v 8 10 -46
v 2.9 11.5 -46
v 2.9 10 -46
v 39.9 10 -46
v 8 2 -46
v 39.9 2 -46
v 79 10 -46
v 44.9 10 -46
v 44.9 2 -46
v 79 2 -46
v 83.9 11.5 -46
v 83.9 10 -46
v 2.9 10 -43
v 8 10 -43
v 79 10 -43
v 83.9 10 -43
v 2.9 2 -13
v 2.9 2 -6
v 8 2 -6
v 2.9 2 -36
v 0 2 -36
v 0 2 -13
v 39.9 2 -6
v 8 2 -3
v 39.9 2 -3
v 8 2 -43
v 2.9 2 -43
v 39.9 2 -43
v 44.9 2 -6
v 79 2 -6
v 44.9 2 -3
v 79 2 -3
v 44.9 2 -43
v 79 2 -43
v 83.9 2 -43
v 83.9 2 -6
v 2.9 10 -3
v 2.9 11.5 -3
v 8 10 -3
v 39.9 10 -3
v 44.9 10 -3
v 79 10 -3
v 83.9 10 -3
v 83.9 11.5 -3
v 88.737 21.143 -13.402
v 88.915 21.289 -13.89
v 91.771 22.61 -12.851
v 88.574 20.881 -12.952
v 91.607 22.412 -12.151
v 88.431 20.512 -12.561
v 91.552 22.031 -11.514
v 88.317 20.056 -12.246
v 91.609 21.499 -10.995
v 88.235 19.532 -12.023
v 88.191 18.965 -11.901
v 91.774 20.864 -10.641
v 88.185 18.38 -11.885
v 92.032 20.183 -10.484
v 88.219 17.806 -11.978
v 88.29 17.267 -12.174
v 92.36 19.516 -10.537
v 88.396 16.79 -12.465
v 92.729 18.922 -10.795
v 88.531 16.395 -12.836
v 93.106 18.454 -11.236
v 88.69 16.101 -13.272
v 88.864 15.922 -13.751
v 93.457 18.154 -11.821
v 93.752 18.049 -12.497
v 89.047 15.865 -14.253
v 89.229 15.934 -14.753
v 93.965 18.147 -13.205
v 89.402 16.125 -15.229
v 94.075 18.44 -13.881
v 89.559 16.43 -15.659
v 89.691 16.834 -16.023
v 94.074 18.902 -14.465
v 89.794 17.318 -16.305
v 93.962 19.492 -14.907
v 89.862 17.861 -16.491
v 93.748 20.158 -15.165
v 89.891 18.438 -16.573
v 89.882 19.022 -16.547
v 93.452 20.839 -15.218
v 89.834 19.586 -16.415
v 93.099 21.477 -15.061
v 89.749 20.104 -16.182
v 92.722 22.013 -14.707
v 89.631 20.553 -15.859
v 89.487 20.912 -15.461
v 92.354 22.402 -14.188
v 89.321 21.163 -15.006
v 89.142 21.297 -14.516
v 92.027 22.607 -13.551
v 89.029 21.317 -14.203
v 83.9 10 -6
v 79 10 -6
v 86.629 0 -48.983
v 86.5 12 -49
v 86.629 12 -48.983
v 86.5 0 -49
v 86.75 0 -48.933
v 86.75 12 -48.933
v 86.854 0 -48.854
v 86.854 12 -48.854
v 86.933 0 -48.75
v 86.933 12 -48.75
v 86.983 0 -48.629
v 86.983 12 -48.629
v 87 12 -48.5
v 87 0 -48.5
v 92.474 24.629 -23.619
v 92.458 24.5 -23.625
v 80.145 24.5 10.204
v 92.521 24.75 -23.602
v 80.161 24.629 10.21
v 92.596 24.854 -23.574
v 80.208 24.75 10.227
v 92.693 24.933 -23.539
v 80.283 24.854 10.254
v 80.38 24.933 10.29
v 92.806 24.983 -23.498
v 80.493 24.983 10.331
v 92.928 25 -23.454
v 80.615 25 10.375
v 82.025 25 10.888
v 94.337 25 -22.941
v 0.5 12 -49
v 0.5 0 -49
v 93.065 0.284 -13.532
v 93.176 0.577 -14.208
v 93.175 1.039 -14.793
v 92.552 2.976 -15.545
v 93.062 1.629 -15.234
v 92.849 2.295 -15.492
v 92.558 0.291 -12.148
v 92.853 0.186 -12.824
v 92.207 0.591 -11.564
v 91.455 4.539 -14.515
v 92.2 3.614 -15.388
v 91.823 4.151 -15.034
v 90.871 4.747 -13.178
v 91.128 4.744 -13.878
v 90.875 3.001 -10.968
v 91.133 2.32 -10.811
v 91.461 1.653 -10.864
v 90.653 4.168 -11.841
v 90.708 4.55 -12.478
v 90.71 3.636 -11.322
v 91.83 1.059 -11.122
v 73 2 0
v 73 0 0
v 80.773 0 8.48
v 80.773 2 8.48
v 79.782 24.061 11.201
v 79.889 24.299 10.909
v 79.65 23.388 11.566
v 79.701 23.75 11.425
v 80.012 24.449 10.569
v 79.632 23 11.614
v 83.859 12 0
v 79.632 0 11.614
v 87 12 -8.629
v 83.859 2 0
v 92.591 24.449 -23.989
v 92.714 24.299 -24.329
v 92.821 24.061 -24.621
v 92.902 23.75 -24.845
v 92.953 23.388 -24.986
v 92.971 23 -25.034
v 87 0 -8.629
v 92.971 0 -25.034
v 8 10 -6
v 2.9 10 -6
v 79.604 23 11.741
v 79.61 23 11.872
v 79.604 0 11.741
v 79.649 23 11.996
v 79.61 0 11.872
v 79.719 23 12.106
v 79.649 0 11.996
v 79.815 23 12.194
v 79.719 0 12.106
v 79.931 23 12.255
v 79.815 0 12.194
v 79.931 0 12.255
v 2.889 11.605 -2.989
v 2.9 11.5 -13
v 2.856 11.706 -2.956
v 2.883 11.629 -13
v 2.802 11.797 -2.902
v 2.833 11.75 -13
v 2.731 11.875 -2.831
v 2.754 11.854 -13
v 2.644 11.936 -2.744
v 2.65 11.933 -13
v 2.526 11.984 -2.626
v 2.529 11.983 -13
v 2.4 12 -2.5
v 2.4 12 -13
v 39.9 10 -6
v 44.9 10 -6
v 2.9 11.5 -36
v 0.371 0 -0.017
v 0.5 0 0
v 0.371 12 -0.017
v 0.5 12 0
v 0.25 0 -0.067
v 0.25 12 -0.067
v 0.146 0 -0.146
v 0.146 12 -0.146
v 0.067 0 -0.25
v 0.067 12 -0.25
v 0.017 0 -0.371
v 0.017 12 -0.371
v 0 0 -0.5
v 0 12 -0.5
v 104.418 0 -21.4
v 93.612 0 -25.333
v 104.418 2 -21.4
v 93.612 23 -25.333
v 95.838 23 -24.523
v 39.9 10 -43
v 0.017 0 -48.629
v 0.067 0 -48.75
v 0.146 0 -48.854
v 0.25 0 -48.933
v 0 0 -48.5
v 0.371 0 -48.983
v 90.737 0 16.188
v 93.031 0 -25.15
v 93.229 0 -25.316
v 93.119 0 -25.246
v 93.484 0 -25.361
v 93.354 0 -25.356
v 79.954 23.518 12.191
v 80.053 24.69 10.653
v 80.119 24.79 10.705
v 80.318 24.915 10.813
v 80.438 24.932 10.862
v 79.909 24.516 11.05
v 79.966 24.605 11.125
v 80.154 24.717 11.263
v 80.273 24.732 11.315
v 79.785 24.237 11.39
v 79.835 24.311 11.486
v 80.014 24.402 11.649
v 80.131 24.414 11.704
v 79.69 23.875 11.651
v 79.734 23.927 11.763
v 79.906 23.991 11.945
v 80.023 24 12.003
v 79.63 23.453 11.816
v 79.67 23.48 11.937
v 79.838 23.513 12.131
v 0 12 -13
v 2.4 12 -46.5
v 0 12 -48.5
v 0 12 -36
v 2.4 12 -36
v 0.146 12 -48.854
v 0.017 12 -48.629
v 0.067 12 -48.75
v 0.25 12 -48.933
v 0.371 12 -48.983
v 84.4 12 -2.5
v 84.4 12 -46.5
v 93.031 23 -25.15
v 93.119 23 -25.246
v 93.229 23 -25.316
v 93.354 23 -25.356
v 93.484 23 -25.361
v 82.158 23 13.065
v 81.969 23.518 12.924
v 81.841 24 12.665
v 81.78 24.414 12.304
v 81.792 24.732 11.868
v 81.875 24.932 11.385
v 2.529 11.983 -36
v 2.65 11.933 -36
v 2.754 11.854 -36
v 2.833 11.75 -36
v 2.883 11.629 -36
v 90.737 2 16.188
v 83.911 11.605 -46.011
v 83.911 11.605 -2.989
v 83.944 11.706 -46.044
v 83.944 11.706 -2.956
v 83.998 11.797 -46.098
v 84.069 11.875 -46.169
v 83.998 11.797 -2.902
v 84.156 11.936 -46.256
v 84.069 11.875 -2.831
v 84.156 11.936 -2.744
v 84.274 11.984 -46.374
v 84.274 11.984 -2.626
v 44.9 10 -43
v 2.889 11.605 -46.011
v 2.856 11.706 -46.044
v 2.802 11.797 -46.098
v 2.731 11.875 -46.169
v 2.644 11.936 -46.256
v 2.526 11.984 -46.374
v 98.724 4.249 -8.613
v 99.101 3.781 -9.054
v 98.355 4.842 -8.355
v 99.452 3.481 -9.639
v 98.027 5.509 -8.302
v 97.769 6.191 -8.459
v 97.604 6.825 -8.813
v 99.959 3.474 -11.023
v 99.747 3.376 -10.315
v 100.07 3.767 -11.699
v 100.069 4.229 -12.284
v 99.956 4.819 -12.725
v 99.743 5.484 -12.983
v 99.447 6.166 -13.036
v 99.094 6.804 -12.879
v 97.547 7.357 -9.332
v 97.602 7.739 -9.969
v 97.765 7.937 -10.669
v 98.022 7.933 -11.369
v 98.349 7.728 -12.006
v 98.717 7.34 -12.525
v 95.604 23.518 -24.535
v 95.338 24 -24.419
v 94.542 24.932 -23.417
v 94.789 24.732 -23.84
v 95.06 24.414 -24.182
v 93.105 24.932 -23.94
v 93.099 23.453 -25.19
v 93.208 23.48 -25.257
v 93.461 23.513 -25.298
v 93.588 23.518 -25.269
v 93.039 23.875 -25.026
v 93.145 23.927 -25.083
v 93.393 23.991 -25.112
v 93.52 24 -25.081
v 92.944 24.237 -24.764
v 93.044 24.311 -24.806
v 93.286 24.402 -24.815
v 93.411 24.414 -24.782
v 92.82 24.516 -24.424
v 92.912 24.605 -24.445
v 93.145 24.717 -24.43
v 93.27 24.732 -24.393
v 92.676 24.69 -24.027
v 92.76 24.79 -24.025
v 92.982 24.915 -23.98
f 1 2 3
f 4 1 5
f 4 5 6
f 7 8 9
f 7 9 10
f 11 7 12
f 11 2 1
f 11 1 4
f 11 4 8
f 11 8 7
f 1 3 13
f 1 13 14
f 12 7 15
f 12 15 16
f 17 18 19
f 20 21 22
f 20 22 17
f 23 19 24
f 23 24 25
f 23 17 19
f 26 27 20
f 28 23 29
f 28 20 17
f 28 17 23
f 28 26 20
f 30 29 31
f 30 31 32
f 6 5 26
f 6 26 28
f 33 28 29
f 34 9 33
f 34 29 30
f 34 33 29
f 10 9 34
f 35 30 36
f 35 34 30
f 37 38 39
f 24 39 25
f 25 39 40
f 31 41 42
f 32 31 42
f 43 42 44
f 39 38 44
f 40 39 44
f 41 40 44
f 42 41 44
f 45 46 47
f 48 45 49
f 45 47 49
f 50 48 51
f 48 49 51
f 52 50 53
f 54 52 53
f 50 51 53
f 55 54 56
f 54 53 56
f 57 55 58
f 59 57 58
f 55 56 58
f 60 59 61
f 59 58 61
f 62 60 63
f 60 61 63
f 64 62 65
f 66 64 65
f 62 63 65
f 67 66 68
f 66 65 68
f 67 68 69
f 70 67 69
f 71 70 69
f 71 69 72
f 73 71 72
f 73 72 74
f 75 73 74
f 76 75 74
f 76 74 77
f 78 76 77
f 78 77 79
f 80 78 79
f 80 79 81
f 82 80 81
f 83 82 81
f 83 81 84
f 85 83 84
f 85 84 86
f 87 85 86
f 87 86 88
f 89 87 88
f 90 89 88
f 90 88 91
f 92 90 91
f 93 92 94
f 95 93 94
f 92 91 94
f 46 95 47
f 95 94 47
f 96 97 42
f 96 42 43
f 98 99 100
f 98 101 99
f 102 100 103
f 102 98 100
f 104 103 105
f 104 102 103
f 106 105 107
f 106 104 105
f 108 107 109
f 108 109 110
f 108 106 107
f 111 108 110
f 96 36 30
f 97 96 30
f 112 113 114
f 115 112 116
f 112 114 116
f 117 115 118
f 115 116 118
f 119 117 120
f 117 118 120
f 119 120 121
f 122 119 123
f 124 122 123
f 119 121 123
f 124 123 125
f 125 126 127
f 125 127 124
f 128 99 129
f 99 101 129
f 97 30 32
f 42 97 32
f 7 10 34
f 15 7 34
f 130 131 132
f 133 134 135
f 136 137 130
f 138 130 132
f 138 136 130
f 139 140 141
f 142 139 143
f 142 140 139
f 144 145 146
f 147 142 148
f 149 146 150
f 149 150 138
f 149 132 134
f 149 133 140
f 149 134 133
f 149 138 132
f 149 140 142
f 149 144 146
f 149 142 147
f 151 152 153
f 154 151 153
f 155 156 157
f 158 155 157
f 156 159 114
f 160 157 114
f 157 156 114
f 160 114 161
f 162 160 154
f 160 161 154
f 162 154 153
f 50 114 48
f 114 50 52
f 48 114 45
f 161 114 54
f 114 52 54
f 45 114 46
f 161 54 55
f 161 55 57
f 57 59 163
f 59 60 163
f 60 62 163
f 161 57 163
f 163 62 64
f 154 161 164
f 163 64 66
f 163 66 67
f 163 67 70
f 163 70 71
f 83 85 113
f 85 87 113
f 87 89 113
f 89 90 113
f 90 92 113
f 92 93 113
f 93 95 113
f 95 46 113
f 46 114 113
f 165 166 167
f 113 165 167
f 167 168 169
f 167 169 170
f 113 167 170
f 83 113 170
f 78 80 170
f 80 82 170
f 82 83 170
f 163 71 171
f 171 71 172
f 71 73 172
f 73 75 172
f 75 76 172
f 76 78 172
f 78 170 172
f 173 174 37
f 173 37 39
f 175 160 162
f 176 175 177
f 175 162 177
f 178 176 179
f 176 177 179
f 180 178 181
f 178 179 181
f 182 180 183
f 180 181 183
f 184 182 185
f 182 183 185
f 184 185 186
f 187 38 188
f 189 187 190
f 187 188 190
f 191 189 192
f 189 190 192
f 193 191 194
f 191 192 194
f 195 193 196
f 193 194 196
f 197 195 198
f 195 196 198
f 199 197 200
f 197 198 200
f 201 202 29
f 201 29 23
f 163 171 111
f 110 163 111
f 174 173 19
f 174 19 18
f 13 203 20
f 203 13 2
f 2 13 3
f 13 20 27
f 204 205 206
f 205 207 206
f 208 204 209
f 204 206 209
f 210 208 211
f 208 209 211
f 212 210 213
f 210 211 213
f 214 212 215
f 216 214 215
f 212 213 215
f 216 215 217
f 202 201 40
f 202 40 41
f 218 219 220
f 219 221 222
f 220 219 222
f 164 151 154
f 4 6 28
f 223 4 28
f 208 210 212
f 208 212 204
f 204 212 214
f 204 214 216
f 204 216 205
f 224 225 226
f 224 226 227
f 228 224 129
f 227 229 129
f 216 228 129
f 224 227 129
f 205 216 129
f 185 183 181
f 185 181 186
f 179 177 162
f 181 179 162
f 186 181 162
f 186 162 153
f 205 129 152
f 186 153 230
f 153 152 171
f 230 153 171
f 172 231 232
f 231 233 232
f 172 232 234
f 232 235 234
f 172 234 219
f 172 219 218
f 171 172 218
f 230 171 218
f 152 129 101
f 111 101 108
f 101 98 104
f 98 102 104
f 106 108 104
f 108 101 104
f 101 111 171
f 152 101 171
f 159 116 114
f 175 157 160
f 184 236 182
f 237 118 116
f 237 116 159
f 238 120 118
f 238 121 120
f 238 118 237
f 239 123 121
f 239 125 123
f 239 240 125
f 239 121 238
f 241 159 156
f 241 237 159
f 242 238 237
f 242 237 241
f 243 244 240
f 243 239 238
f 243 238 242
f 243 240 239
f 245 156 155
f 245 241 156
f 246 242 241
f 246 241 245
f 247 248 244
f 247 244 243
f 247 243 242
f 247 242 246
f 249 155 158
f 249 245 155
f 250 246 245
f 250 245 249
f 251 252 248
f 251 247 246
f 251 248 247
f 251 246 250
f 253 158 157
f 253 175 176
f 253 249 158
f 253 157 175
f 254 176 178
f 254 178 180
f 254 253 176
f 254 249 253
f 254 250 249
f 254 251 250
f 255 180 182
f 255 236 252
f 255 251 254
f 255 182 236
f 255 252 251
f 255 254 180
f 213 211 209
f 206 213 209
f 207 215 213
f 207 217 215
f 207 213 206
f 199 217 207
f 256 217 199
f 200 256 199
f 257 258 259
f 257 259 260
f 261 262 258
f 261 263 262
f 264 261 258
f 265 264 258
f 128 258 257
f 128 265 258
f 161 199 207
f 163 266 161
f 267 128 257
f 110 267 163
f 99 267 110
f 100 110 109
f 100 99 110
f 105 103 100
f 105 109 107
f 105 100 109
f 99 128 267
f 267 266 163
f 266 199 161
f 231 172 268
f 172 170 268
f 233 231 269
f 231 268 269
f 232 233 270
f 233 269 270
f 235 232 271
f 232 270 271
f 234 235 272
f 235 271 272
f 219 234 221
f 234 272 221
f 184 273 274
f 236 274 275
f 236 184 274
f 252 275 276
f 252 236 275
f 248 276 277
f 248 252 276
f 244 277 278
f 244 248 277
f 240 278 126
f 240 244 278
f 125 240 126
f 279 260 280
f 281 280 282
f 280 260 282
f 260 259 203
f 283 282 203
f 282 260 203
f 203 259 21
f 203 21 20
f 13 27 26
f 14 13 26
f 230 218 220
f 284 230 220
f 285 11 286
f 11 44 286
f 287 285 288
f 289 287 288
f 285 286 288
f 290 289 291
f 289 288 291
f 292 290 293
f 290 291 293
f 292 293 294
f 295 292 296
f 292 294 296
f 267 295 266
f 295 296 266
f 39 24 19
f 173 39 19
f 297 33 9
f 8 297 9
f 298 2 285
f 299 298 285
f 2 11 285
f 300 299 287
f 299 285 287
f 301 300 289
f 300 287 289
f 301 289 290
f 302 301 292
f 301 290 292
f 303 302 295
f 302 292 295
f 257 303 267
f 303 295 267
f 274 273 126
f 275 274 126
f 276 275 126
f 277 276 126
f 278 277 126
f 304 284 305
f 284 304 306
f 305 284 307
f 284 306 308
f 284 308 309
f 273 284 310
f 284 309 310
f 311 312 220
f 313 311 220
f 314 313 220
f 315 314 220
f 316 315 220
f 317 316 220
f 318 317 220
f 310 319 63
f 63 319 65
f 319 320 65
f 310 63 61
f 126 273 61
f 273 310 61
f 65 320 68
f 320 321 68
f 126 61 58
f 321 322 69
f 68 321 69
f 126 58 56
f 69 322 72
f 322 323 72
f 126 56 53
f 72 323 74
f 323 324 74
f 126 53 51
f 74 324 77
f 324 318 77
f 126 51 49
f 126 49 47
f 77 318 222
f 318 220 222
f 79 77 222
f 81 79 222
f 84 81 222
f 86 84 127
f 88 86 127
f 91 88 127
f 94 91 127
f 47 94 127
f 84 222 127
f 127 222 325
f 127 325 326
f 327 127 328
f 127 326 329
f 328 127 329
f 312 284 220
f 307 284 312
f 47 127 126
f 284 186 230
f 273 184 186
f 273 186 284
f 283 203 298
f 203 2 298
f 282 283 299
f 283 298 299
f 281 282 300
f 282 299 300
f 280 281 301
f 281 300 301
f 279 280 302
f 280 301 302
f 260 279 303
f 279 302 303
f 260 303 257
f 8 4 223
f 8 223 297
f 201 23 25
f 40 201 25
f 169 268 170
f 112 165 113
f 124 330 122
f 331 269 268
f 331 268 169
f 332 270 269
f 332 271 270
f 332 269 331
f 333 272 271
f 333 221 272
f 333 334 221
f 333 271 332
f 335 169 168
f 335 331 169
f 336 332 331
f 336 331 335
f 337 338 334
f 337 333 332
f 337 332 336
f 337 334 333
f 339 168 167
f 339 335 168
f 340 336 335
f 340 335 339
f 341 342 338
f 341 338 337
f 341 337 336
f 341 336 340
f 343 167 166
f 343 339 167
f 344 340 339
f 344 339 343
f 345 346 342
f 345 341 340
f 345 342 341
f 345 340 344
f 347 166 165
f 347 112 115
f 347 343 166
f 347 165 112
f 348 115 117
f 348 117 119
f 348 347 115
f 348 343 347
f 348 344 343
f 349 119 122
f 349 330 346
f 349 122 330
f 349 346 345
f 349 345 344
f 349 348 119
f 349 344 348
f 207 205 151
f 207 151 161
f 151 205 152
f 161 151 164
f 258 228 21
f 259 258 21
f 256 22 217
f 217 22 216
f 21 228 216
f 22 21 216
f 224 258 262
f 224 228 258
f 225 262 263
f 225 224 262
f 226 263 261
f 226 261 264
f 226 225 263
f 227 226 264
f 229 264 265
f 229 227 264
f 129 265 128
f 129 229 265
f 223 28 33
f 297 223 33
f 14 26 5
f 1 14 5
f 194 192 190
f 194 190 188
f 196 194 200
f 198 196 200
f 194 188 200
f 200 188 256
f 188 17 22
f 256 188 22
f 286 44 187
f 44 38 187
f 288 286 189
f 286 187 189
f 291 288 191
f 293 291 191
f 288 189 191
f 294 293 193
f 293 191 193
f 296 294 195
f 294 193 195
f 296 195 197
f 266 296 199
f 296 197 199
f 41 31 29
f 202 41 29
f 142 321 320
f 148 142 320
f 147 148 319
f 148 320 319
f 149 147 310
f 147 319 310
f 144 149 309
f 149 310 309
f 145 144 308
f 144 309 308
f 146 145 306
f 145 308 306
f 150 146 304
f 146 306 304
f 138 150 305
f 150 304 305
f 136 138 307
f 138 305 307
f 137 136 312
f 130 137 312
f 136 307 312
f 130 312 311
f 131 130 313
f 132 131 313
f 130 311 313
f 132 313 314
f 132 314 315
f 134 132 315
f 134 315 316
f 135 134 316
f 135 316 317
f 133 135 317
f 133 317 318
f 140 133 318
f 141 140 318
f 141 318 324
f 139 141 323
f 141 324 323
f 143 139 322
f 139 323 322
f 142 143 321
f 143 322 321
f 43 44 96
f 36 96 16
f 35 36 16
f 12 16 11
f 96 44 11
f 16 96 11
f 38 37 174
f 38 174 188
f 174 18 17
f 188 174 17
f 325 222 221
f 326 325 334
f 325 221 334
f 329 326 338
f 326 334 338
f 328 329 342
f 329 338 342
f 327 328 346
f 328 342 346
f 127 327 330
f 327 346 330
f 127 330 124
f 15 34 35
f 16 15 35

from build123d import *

# Parameters (mm, degrees)
BOSS_EXTRUDE1_DEPTH   = 40
BODY_MOVE_COPY1_ANGLE = 20
BOSS_EXTRUDE2_DEPTH   = 2
BOSS_EXTRUDE3_DEPTH   = 12
SKETCH4_R             = 2.5
CUT_EXTRUDE2_DEPTH    = 8
FILLET1_R             = 2
SKETCH10_W            = 4.9
SKETCH10_H            = 3
SKETCH10_W_2          = 5.1
SKETCH10_W_3          = 5
CUT_EXTRUDE4_DEPTH    = 2
FILLET2_R             = 0.5


with BuildPart() as part:
    # Sketch2 → Boss-Extrude1 (new body)
    with BuildSketch(Plane.XY):
        Polygon((90, 0), (102, 0), (102, 2), (92, 25), (90, 25), align=None)
    extrude(amount=BOSS_EXTRUDE1_DEPTH)


with BuildPart() as part_1:
    # Body-Move/Copy1: moved
    add(part.part.rotate(Axis((95, 0, 20), (0, -1, 0)), BODY_MOVE_COPY1_ANGLE))


with BuildPart() as part_2:
    # Body-Move/Copy2: moved
    add(part_1.part.moved(Location((-4, 0, -25))))

    # Sketch1 → Boss-Extrude2 (add)
    with BuildSketch(Plane(origin=(0, 0, 0), x_dir=(1, 0, 0), z_dir=(0, 1, 0))):
        Polygon((0, 49), (0, 0), (73, 0), (84, -12), (87, 0), (87, 49), align=None)
    extrude(amount=BOSS_EXTRUDE2_DEPTH)

    # Sketch1<4> → Boss-Extrude3 (add)
    with BuildSketch(Plane(origin=(0, 0, 0), x_dir=(1, 0, 0), z_dir=(0, 1, 0))):
        Polygon((8, 43), (8, 46), (39.9, 46), (39.9, 43), (44.9, 43), (44.9, 46), (79, 46), (79, 43), (83.9, 43), (83.9, 6), (79, 6), (79, 3), (44.9, 3), (44.9, 6), (39.9, 6), (39.9, 3), (8, 3), (8, 6), (2.9, 6), (2.9, 13), (0, 13), (0, 0), (73, 0), (87, 0), (87, 49), (0, 49), (0, 36), (2.9, 36), (2.9, 43), align=None)
    extrude(amount=BOSS_EXTRUDE3_DEPTH)

    # Sketch4 → Cut-Extrude2 (cut)
    with BuildSketch(Plane(origin=(72.447790922, 33.520577724, 26.368839434), x_dir=(0.30020671045987535, 0.09758957417323016, -0.948868908757974), z_dir=(0.8617639646050662, 0.3987261114144503, 0.31365643207890637))):
        with Locations(Location((42.044187921, -18.952687866, 0), (0, 0, 92.148700458))):
            Circle(SKETCH4_R)
        with Locations(Location((40.341555526, -34.861837527, 0), (0, 0, 92.148700458))):
            Circle(SKETCH4_R)
    extrude(amount=-CUT_EXTRUDE2_DEPTH, mode=Mode.SUBTRACT)

    # Fillet1
    fillet1_edges = [part_2.edges().sort_by_distance(p)[0] for p in [
        (80.40082665, 25, 12.425771842),
        (94.081632383, 25, -25.161932989),
    ]]
    fillet(fillet1_edges, radius=FILLET1_R)

    # Sketch10 → Cut-Extrude4 (cut)
    with BuildSketch(Plane(origin=(0, 12, 0), x_dir=(1, 0, 0), z_dir=(0, 1, 0))):
        with Locations((81.45, 4.5)):
            Rectangle(SKETCH10_W, SKETCH10_H)
        with Locations((42.45, 4.5)):
            Rectangle(SKETCH10_W_2, SKETCH10_H)
        with Locations((42.4, 44.5)):
            Rectangle(SKETCH10_W_3, SKETCH10_H)
        with Locations((81.45, 44.5)):
            Rectangle(SKETCH10_W, SKETCH10_H)
        with Locations((5.45, 44.5)):
            Rectangle(SKETCH10_W_2, SKETCH10_H)
        with Locations((5.45, 4.5)):
            Rectangle(SKETCH10_W_2, SKETCH10_H)
    extrude(amount=-CUT_EXTRUDE4_DEPTH, mode=Mode.SUBTRACT)

    # Fillet2
    fillet2_edges = [part_2.edges().sort_by_distance(p)[0] for p in [
        (86.301536896, 25, -6.710100717),
        (79.46113403, 11.5, 12.083751699),
        (93.141939763, 11.5, -25.503953132),
        (79.661484791, 24.414213562, 11.533292506),
        (92.941589001, 24.414213562, -24.95349394),
        (87, 6, -49),
        (0, 6, -49),
        (0, 6, 0),
        (2.9, 12, -41),
        (43.4, 12, -46),
        (83.9, 12, -24.5),
        (2.9, 12, -8),
        (43.4, 12, -3),
    ]]
    fillet(fillet2_edges, radius=FILLET2_R)


solid = part_2.part
